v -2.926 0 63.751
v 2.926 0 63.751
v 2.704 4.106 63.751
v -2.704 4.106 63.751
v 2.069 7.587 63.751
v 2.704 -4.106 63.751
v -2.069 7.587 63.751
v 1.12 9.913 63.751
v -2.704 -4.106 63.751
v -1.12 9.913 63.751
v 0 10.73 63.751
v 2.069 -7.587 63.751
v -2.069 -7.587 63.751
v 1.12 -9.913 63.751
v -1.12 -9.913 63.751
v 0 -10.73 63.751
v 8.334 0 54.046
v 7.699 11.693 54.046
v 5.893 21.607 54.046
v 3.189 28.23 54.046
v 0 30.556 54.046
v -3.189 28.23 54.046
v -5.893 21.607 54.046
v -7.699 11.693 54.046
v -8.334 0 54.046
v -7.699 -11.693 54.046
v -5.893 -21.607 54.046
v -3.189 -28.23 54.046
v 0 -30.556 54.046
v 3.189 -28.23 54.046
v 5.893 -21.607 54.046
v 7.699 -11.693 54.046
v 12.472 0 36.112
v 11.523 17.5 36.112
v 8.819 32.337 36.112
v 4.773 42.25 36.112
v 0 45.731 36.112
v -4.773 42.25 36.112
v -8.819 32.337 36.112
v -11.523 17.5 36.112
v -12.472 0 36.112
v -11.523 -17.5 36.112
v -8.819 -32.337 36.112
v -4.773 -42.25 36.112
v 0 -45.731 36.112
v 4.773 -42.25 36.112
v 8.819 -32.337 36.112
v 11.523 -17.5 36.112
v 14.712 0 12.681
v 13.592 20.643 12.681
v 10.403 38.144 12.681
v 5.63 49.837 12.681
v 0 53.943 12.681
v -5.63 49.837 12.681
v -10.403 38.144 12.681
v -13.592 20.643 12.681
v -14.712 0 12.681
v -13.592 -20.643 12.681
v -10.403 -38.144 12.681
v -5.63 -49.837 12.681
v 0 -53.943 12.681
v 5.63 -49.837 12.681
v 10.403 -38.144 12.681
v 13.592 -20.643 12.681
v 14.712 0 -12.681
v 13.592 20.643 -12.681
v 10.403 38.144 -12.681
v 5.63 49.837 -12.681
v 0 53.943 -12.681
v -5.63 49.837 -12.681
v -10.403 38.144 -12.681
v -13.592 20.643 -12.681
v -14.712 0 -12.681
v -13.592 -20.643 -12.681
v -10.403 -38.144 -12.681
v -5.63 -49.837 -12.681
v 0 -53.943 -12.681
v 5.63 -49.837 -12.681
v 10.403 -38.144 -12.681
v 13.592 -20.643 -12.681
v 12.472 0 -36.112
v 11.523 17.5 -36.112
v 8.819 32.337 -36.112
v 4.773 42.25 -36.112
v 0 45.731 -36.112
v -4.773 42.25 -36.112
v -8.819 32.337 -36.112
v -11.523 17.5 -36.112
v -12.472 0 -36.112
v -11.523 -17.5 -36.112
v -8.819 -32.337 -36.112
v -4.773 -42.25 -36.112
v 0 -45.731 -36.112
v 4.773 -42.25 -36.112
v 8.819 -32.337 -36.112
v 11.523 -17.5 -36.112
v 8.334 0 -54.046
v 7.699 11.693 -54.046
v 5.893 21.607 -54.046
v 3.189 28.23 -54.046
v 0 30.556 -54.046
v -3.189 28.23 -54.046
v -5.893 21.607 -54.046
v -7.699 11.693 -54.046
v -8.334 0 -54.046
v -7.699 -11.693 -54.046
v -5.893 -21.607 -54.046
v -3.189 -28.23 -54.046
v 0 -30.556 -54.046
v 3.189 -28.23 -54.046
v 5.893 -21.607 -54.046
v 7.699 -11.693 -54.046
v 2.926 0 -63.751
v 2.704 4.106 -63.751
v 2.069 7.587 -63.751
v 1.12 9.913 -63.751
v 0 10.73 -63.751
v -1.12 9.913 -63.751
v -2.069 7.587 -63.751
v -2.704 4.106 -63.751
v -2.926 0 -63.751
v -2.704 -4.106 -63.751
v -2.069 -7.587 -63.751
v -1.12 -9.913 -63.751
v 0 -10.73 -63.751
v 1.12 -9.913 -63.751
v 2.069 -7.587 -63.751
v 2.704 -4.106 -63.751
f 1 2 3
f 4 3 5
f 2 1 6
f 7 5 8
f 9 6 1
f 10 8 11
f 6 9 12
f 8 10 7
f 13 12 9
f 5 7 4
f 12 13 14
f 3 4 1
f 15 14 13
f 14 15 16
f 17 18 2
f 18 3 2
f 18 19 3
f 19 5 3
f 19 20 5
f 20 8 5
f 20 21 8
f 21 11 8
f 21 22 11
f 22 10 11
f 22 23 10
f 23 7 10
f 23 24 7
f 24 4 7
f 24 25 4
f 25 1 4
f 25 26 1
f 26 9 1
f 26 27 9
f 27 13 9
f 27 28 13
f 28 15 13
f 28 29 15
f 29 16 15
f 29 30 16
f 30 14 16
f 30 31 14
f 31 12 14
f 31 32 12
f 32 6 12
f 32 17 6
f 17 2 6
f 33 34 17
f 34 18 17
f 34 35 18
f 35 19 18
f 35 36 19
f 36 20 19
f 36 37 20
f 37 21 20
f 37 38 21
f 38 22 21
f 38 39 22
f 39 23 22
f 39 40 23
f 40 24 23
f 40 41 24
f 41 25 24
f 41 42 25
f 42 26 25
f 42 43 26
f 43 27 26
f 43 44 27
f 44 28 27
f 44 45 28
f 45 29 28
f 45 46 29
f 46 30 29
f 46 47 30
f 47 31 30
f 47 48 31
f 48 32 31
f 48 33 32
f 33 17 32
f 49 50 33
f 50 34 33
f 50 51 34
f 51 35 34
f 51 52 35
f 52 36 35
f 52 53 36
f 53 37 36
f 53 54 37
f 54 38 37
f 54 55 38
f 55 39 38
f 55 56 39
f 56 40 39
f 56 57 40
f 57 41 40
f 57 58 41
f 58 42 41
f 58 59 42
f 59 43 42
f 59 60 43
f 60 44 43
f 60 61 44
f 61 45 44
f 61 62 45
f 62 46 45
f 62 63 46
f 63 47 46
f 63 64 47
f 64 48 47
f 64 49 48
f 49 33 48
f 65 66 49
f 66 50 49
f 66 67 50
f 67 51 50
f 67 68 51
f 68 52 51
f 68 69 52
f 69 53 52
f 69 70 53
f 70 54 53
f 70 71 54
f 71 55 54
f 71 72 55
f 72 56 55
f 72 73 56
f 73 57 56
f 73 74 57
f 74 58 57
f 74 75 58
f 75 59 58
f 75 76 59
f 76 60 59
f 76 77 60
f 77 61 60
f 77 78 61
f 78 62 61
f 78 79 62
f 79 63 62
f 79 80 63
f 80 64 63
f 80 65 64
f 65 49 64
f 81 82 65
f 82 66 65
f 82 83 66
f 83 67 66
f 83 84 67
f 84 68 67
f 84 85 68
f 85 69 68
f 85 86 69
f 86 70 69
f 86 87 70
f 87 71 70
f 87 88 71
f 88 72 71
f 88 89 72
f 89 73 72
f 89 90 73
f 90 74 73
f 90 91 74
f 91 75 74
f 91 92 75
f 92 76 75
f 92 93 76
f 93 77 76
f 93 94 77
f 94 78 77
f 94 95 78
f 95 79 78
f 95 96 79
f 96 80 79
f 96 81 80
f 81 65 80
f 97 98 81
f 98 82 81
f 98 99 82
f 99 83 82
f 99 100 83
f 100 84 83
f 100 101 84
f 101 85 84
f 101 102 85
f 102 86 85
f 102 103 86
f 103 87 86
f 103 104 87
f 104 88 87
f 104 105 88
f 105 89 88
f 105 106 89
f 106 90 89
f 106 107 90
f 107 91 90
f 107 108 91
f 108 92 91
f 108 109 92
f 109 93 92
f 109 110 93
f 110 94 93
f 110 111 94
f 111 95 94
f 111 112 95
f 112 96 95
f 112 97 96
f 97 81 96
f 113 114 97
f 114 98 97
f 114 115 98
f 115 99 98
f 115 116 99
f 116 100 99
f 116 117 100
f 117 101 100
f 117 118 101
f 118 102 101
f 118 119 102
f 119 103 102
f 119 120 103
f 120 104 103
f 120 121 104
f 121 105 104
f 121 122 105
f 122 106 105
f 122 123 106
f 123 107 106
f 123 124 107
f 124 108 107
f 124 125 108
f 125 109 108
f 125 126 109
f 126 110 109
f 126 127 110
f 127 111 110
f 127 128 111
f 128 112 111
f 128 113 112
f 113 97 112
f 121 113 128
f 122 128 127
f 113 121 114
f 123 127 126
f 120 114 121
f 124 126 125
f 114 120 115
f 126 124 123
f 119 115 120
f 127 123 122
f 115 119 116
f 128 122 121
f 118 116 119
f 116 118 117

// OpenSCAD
// Generated by SolidPython 1.0.1 on 2020-07-29 00:46:45


scale(v = [3, 11, 13]) {
	sphere(r = 5);
}
/***********************************************
*********      SolidPython code:      **********
************************************************
 
# import packages: SolidPython
from solid import *
from solid.utils import *
from itertools import chain, combinations, permutations


class Resize:

    def __init__(self, scad_file):
        self.scad_file = scad_file
        #self.scad_file = import_scad(scad_file)
        # cone/cylinder param:
        self.r1 = 0
        self.r2 = 0
        self.h = 0
        # rectangular prism param:
        self.w = 0
        self.l = 0
        # ellipse param:
        self.r = 0

    # import OpenScad code (file name corresponds to shape)


    # classify shape + parameters
    def assign(self, param1, param2, param3):
        if self.scad_file == 'cone.scad':
            self.r1 = param1
            self.r2 = param2
            self.h = param3
        elif self.scad_file == 'cylinder.scad':
            self.r1 = param1
            self.r2 = param2
            self.h = param3
        elif self.scad_file == 'rectangularPrism.scad':
            self.h = param1
            self.l = param2
            self.w = param3
        else:
            self.r = param1
            self.h = param2

    # resize parameters
    def iterate(self):
        x = range(3, 20, 2)
        i = 1
        if self.scad_file == 'cone.scad':
            tempList = list(permutations(x, 2))
            for temp in tempList:
                param1 = temp[0]
                param2 = temp[1]
                filepath = 'produced_scad_files/' + 'cone' + str(param1) + '_' + str(param2) + '_' + '.scad'
                scad_render_to_file(cylinder(h=param1, r1=param2, r2=0), filepath)

        elif self.scad_file == 'cylinder.scad':
            tempList = list(permutations(x, 3))
            for temp in tempList:
                param1 = temp[0]
                param2 = temp[1]
                filepath = 'produced_scad_files/' + 'cylinder' + str(param1) + '_' + str(param2) + '_' + '.scad'
                scad_render_to_file(cylinder(h=param1, r1=param2, r2=param2), filepath)

        elif self.scad_file == 'rectangularPrism.scad':
            tempList = list(permutations(x, 3))
            for temp in tempList:
                param1 = temp[0]
                param2 = temp[1]
                param3 = temp[2]
                filepath = 'produced_scad_files/' + 'rectangularPrism' + str(param1) + '_' + str(param2) + '_' + str(
                    param3) + '.scad'
                scad_render_to_file(cube(size=(param1, param2, param3)), filepath)

        elif self.scad_file == 'ellipse.scad':
            tempList = list(permutations(x, 4))
            for temp in tempList:
                param1 = temp[0]
                param2 = temp[1]
                param3 = temp[2]
                param4 = temp[3]
                filepath = 'produced_scad_files/' + 'ellipse' + str(param1) + '_' + str(param2) + '_' + str(param3) + '_' + str(param4) + '.scad'
                scad_render_to_file(scale([param1, param2, param3])(sphere(r=param4)), filepath)

    def render_to_scadfile(self):
        scad_render_to_file(scad, 'example.scad') 
 
************************************************/
